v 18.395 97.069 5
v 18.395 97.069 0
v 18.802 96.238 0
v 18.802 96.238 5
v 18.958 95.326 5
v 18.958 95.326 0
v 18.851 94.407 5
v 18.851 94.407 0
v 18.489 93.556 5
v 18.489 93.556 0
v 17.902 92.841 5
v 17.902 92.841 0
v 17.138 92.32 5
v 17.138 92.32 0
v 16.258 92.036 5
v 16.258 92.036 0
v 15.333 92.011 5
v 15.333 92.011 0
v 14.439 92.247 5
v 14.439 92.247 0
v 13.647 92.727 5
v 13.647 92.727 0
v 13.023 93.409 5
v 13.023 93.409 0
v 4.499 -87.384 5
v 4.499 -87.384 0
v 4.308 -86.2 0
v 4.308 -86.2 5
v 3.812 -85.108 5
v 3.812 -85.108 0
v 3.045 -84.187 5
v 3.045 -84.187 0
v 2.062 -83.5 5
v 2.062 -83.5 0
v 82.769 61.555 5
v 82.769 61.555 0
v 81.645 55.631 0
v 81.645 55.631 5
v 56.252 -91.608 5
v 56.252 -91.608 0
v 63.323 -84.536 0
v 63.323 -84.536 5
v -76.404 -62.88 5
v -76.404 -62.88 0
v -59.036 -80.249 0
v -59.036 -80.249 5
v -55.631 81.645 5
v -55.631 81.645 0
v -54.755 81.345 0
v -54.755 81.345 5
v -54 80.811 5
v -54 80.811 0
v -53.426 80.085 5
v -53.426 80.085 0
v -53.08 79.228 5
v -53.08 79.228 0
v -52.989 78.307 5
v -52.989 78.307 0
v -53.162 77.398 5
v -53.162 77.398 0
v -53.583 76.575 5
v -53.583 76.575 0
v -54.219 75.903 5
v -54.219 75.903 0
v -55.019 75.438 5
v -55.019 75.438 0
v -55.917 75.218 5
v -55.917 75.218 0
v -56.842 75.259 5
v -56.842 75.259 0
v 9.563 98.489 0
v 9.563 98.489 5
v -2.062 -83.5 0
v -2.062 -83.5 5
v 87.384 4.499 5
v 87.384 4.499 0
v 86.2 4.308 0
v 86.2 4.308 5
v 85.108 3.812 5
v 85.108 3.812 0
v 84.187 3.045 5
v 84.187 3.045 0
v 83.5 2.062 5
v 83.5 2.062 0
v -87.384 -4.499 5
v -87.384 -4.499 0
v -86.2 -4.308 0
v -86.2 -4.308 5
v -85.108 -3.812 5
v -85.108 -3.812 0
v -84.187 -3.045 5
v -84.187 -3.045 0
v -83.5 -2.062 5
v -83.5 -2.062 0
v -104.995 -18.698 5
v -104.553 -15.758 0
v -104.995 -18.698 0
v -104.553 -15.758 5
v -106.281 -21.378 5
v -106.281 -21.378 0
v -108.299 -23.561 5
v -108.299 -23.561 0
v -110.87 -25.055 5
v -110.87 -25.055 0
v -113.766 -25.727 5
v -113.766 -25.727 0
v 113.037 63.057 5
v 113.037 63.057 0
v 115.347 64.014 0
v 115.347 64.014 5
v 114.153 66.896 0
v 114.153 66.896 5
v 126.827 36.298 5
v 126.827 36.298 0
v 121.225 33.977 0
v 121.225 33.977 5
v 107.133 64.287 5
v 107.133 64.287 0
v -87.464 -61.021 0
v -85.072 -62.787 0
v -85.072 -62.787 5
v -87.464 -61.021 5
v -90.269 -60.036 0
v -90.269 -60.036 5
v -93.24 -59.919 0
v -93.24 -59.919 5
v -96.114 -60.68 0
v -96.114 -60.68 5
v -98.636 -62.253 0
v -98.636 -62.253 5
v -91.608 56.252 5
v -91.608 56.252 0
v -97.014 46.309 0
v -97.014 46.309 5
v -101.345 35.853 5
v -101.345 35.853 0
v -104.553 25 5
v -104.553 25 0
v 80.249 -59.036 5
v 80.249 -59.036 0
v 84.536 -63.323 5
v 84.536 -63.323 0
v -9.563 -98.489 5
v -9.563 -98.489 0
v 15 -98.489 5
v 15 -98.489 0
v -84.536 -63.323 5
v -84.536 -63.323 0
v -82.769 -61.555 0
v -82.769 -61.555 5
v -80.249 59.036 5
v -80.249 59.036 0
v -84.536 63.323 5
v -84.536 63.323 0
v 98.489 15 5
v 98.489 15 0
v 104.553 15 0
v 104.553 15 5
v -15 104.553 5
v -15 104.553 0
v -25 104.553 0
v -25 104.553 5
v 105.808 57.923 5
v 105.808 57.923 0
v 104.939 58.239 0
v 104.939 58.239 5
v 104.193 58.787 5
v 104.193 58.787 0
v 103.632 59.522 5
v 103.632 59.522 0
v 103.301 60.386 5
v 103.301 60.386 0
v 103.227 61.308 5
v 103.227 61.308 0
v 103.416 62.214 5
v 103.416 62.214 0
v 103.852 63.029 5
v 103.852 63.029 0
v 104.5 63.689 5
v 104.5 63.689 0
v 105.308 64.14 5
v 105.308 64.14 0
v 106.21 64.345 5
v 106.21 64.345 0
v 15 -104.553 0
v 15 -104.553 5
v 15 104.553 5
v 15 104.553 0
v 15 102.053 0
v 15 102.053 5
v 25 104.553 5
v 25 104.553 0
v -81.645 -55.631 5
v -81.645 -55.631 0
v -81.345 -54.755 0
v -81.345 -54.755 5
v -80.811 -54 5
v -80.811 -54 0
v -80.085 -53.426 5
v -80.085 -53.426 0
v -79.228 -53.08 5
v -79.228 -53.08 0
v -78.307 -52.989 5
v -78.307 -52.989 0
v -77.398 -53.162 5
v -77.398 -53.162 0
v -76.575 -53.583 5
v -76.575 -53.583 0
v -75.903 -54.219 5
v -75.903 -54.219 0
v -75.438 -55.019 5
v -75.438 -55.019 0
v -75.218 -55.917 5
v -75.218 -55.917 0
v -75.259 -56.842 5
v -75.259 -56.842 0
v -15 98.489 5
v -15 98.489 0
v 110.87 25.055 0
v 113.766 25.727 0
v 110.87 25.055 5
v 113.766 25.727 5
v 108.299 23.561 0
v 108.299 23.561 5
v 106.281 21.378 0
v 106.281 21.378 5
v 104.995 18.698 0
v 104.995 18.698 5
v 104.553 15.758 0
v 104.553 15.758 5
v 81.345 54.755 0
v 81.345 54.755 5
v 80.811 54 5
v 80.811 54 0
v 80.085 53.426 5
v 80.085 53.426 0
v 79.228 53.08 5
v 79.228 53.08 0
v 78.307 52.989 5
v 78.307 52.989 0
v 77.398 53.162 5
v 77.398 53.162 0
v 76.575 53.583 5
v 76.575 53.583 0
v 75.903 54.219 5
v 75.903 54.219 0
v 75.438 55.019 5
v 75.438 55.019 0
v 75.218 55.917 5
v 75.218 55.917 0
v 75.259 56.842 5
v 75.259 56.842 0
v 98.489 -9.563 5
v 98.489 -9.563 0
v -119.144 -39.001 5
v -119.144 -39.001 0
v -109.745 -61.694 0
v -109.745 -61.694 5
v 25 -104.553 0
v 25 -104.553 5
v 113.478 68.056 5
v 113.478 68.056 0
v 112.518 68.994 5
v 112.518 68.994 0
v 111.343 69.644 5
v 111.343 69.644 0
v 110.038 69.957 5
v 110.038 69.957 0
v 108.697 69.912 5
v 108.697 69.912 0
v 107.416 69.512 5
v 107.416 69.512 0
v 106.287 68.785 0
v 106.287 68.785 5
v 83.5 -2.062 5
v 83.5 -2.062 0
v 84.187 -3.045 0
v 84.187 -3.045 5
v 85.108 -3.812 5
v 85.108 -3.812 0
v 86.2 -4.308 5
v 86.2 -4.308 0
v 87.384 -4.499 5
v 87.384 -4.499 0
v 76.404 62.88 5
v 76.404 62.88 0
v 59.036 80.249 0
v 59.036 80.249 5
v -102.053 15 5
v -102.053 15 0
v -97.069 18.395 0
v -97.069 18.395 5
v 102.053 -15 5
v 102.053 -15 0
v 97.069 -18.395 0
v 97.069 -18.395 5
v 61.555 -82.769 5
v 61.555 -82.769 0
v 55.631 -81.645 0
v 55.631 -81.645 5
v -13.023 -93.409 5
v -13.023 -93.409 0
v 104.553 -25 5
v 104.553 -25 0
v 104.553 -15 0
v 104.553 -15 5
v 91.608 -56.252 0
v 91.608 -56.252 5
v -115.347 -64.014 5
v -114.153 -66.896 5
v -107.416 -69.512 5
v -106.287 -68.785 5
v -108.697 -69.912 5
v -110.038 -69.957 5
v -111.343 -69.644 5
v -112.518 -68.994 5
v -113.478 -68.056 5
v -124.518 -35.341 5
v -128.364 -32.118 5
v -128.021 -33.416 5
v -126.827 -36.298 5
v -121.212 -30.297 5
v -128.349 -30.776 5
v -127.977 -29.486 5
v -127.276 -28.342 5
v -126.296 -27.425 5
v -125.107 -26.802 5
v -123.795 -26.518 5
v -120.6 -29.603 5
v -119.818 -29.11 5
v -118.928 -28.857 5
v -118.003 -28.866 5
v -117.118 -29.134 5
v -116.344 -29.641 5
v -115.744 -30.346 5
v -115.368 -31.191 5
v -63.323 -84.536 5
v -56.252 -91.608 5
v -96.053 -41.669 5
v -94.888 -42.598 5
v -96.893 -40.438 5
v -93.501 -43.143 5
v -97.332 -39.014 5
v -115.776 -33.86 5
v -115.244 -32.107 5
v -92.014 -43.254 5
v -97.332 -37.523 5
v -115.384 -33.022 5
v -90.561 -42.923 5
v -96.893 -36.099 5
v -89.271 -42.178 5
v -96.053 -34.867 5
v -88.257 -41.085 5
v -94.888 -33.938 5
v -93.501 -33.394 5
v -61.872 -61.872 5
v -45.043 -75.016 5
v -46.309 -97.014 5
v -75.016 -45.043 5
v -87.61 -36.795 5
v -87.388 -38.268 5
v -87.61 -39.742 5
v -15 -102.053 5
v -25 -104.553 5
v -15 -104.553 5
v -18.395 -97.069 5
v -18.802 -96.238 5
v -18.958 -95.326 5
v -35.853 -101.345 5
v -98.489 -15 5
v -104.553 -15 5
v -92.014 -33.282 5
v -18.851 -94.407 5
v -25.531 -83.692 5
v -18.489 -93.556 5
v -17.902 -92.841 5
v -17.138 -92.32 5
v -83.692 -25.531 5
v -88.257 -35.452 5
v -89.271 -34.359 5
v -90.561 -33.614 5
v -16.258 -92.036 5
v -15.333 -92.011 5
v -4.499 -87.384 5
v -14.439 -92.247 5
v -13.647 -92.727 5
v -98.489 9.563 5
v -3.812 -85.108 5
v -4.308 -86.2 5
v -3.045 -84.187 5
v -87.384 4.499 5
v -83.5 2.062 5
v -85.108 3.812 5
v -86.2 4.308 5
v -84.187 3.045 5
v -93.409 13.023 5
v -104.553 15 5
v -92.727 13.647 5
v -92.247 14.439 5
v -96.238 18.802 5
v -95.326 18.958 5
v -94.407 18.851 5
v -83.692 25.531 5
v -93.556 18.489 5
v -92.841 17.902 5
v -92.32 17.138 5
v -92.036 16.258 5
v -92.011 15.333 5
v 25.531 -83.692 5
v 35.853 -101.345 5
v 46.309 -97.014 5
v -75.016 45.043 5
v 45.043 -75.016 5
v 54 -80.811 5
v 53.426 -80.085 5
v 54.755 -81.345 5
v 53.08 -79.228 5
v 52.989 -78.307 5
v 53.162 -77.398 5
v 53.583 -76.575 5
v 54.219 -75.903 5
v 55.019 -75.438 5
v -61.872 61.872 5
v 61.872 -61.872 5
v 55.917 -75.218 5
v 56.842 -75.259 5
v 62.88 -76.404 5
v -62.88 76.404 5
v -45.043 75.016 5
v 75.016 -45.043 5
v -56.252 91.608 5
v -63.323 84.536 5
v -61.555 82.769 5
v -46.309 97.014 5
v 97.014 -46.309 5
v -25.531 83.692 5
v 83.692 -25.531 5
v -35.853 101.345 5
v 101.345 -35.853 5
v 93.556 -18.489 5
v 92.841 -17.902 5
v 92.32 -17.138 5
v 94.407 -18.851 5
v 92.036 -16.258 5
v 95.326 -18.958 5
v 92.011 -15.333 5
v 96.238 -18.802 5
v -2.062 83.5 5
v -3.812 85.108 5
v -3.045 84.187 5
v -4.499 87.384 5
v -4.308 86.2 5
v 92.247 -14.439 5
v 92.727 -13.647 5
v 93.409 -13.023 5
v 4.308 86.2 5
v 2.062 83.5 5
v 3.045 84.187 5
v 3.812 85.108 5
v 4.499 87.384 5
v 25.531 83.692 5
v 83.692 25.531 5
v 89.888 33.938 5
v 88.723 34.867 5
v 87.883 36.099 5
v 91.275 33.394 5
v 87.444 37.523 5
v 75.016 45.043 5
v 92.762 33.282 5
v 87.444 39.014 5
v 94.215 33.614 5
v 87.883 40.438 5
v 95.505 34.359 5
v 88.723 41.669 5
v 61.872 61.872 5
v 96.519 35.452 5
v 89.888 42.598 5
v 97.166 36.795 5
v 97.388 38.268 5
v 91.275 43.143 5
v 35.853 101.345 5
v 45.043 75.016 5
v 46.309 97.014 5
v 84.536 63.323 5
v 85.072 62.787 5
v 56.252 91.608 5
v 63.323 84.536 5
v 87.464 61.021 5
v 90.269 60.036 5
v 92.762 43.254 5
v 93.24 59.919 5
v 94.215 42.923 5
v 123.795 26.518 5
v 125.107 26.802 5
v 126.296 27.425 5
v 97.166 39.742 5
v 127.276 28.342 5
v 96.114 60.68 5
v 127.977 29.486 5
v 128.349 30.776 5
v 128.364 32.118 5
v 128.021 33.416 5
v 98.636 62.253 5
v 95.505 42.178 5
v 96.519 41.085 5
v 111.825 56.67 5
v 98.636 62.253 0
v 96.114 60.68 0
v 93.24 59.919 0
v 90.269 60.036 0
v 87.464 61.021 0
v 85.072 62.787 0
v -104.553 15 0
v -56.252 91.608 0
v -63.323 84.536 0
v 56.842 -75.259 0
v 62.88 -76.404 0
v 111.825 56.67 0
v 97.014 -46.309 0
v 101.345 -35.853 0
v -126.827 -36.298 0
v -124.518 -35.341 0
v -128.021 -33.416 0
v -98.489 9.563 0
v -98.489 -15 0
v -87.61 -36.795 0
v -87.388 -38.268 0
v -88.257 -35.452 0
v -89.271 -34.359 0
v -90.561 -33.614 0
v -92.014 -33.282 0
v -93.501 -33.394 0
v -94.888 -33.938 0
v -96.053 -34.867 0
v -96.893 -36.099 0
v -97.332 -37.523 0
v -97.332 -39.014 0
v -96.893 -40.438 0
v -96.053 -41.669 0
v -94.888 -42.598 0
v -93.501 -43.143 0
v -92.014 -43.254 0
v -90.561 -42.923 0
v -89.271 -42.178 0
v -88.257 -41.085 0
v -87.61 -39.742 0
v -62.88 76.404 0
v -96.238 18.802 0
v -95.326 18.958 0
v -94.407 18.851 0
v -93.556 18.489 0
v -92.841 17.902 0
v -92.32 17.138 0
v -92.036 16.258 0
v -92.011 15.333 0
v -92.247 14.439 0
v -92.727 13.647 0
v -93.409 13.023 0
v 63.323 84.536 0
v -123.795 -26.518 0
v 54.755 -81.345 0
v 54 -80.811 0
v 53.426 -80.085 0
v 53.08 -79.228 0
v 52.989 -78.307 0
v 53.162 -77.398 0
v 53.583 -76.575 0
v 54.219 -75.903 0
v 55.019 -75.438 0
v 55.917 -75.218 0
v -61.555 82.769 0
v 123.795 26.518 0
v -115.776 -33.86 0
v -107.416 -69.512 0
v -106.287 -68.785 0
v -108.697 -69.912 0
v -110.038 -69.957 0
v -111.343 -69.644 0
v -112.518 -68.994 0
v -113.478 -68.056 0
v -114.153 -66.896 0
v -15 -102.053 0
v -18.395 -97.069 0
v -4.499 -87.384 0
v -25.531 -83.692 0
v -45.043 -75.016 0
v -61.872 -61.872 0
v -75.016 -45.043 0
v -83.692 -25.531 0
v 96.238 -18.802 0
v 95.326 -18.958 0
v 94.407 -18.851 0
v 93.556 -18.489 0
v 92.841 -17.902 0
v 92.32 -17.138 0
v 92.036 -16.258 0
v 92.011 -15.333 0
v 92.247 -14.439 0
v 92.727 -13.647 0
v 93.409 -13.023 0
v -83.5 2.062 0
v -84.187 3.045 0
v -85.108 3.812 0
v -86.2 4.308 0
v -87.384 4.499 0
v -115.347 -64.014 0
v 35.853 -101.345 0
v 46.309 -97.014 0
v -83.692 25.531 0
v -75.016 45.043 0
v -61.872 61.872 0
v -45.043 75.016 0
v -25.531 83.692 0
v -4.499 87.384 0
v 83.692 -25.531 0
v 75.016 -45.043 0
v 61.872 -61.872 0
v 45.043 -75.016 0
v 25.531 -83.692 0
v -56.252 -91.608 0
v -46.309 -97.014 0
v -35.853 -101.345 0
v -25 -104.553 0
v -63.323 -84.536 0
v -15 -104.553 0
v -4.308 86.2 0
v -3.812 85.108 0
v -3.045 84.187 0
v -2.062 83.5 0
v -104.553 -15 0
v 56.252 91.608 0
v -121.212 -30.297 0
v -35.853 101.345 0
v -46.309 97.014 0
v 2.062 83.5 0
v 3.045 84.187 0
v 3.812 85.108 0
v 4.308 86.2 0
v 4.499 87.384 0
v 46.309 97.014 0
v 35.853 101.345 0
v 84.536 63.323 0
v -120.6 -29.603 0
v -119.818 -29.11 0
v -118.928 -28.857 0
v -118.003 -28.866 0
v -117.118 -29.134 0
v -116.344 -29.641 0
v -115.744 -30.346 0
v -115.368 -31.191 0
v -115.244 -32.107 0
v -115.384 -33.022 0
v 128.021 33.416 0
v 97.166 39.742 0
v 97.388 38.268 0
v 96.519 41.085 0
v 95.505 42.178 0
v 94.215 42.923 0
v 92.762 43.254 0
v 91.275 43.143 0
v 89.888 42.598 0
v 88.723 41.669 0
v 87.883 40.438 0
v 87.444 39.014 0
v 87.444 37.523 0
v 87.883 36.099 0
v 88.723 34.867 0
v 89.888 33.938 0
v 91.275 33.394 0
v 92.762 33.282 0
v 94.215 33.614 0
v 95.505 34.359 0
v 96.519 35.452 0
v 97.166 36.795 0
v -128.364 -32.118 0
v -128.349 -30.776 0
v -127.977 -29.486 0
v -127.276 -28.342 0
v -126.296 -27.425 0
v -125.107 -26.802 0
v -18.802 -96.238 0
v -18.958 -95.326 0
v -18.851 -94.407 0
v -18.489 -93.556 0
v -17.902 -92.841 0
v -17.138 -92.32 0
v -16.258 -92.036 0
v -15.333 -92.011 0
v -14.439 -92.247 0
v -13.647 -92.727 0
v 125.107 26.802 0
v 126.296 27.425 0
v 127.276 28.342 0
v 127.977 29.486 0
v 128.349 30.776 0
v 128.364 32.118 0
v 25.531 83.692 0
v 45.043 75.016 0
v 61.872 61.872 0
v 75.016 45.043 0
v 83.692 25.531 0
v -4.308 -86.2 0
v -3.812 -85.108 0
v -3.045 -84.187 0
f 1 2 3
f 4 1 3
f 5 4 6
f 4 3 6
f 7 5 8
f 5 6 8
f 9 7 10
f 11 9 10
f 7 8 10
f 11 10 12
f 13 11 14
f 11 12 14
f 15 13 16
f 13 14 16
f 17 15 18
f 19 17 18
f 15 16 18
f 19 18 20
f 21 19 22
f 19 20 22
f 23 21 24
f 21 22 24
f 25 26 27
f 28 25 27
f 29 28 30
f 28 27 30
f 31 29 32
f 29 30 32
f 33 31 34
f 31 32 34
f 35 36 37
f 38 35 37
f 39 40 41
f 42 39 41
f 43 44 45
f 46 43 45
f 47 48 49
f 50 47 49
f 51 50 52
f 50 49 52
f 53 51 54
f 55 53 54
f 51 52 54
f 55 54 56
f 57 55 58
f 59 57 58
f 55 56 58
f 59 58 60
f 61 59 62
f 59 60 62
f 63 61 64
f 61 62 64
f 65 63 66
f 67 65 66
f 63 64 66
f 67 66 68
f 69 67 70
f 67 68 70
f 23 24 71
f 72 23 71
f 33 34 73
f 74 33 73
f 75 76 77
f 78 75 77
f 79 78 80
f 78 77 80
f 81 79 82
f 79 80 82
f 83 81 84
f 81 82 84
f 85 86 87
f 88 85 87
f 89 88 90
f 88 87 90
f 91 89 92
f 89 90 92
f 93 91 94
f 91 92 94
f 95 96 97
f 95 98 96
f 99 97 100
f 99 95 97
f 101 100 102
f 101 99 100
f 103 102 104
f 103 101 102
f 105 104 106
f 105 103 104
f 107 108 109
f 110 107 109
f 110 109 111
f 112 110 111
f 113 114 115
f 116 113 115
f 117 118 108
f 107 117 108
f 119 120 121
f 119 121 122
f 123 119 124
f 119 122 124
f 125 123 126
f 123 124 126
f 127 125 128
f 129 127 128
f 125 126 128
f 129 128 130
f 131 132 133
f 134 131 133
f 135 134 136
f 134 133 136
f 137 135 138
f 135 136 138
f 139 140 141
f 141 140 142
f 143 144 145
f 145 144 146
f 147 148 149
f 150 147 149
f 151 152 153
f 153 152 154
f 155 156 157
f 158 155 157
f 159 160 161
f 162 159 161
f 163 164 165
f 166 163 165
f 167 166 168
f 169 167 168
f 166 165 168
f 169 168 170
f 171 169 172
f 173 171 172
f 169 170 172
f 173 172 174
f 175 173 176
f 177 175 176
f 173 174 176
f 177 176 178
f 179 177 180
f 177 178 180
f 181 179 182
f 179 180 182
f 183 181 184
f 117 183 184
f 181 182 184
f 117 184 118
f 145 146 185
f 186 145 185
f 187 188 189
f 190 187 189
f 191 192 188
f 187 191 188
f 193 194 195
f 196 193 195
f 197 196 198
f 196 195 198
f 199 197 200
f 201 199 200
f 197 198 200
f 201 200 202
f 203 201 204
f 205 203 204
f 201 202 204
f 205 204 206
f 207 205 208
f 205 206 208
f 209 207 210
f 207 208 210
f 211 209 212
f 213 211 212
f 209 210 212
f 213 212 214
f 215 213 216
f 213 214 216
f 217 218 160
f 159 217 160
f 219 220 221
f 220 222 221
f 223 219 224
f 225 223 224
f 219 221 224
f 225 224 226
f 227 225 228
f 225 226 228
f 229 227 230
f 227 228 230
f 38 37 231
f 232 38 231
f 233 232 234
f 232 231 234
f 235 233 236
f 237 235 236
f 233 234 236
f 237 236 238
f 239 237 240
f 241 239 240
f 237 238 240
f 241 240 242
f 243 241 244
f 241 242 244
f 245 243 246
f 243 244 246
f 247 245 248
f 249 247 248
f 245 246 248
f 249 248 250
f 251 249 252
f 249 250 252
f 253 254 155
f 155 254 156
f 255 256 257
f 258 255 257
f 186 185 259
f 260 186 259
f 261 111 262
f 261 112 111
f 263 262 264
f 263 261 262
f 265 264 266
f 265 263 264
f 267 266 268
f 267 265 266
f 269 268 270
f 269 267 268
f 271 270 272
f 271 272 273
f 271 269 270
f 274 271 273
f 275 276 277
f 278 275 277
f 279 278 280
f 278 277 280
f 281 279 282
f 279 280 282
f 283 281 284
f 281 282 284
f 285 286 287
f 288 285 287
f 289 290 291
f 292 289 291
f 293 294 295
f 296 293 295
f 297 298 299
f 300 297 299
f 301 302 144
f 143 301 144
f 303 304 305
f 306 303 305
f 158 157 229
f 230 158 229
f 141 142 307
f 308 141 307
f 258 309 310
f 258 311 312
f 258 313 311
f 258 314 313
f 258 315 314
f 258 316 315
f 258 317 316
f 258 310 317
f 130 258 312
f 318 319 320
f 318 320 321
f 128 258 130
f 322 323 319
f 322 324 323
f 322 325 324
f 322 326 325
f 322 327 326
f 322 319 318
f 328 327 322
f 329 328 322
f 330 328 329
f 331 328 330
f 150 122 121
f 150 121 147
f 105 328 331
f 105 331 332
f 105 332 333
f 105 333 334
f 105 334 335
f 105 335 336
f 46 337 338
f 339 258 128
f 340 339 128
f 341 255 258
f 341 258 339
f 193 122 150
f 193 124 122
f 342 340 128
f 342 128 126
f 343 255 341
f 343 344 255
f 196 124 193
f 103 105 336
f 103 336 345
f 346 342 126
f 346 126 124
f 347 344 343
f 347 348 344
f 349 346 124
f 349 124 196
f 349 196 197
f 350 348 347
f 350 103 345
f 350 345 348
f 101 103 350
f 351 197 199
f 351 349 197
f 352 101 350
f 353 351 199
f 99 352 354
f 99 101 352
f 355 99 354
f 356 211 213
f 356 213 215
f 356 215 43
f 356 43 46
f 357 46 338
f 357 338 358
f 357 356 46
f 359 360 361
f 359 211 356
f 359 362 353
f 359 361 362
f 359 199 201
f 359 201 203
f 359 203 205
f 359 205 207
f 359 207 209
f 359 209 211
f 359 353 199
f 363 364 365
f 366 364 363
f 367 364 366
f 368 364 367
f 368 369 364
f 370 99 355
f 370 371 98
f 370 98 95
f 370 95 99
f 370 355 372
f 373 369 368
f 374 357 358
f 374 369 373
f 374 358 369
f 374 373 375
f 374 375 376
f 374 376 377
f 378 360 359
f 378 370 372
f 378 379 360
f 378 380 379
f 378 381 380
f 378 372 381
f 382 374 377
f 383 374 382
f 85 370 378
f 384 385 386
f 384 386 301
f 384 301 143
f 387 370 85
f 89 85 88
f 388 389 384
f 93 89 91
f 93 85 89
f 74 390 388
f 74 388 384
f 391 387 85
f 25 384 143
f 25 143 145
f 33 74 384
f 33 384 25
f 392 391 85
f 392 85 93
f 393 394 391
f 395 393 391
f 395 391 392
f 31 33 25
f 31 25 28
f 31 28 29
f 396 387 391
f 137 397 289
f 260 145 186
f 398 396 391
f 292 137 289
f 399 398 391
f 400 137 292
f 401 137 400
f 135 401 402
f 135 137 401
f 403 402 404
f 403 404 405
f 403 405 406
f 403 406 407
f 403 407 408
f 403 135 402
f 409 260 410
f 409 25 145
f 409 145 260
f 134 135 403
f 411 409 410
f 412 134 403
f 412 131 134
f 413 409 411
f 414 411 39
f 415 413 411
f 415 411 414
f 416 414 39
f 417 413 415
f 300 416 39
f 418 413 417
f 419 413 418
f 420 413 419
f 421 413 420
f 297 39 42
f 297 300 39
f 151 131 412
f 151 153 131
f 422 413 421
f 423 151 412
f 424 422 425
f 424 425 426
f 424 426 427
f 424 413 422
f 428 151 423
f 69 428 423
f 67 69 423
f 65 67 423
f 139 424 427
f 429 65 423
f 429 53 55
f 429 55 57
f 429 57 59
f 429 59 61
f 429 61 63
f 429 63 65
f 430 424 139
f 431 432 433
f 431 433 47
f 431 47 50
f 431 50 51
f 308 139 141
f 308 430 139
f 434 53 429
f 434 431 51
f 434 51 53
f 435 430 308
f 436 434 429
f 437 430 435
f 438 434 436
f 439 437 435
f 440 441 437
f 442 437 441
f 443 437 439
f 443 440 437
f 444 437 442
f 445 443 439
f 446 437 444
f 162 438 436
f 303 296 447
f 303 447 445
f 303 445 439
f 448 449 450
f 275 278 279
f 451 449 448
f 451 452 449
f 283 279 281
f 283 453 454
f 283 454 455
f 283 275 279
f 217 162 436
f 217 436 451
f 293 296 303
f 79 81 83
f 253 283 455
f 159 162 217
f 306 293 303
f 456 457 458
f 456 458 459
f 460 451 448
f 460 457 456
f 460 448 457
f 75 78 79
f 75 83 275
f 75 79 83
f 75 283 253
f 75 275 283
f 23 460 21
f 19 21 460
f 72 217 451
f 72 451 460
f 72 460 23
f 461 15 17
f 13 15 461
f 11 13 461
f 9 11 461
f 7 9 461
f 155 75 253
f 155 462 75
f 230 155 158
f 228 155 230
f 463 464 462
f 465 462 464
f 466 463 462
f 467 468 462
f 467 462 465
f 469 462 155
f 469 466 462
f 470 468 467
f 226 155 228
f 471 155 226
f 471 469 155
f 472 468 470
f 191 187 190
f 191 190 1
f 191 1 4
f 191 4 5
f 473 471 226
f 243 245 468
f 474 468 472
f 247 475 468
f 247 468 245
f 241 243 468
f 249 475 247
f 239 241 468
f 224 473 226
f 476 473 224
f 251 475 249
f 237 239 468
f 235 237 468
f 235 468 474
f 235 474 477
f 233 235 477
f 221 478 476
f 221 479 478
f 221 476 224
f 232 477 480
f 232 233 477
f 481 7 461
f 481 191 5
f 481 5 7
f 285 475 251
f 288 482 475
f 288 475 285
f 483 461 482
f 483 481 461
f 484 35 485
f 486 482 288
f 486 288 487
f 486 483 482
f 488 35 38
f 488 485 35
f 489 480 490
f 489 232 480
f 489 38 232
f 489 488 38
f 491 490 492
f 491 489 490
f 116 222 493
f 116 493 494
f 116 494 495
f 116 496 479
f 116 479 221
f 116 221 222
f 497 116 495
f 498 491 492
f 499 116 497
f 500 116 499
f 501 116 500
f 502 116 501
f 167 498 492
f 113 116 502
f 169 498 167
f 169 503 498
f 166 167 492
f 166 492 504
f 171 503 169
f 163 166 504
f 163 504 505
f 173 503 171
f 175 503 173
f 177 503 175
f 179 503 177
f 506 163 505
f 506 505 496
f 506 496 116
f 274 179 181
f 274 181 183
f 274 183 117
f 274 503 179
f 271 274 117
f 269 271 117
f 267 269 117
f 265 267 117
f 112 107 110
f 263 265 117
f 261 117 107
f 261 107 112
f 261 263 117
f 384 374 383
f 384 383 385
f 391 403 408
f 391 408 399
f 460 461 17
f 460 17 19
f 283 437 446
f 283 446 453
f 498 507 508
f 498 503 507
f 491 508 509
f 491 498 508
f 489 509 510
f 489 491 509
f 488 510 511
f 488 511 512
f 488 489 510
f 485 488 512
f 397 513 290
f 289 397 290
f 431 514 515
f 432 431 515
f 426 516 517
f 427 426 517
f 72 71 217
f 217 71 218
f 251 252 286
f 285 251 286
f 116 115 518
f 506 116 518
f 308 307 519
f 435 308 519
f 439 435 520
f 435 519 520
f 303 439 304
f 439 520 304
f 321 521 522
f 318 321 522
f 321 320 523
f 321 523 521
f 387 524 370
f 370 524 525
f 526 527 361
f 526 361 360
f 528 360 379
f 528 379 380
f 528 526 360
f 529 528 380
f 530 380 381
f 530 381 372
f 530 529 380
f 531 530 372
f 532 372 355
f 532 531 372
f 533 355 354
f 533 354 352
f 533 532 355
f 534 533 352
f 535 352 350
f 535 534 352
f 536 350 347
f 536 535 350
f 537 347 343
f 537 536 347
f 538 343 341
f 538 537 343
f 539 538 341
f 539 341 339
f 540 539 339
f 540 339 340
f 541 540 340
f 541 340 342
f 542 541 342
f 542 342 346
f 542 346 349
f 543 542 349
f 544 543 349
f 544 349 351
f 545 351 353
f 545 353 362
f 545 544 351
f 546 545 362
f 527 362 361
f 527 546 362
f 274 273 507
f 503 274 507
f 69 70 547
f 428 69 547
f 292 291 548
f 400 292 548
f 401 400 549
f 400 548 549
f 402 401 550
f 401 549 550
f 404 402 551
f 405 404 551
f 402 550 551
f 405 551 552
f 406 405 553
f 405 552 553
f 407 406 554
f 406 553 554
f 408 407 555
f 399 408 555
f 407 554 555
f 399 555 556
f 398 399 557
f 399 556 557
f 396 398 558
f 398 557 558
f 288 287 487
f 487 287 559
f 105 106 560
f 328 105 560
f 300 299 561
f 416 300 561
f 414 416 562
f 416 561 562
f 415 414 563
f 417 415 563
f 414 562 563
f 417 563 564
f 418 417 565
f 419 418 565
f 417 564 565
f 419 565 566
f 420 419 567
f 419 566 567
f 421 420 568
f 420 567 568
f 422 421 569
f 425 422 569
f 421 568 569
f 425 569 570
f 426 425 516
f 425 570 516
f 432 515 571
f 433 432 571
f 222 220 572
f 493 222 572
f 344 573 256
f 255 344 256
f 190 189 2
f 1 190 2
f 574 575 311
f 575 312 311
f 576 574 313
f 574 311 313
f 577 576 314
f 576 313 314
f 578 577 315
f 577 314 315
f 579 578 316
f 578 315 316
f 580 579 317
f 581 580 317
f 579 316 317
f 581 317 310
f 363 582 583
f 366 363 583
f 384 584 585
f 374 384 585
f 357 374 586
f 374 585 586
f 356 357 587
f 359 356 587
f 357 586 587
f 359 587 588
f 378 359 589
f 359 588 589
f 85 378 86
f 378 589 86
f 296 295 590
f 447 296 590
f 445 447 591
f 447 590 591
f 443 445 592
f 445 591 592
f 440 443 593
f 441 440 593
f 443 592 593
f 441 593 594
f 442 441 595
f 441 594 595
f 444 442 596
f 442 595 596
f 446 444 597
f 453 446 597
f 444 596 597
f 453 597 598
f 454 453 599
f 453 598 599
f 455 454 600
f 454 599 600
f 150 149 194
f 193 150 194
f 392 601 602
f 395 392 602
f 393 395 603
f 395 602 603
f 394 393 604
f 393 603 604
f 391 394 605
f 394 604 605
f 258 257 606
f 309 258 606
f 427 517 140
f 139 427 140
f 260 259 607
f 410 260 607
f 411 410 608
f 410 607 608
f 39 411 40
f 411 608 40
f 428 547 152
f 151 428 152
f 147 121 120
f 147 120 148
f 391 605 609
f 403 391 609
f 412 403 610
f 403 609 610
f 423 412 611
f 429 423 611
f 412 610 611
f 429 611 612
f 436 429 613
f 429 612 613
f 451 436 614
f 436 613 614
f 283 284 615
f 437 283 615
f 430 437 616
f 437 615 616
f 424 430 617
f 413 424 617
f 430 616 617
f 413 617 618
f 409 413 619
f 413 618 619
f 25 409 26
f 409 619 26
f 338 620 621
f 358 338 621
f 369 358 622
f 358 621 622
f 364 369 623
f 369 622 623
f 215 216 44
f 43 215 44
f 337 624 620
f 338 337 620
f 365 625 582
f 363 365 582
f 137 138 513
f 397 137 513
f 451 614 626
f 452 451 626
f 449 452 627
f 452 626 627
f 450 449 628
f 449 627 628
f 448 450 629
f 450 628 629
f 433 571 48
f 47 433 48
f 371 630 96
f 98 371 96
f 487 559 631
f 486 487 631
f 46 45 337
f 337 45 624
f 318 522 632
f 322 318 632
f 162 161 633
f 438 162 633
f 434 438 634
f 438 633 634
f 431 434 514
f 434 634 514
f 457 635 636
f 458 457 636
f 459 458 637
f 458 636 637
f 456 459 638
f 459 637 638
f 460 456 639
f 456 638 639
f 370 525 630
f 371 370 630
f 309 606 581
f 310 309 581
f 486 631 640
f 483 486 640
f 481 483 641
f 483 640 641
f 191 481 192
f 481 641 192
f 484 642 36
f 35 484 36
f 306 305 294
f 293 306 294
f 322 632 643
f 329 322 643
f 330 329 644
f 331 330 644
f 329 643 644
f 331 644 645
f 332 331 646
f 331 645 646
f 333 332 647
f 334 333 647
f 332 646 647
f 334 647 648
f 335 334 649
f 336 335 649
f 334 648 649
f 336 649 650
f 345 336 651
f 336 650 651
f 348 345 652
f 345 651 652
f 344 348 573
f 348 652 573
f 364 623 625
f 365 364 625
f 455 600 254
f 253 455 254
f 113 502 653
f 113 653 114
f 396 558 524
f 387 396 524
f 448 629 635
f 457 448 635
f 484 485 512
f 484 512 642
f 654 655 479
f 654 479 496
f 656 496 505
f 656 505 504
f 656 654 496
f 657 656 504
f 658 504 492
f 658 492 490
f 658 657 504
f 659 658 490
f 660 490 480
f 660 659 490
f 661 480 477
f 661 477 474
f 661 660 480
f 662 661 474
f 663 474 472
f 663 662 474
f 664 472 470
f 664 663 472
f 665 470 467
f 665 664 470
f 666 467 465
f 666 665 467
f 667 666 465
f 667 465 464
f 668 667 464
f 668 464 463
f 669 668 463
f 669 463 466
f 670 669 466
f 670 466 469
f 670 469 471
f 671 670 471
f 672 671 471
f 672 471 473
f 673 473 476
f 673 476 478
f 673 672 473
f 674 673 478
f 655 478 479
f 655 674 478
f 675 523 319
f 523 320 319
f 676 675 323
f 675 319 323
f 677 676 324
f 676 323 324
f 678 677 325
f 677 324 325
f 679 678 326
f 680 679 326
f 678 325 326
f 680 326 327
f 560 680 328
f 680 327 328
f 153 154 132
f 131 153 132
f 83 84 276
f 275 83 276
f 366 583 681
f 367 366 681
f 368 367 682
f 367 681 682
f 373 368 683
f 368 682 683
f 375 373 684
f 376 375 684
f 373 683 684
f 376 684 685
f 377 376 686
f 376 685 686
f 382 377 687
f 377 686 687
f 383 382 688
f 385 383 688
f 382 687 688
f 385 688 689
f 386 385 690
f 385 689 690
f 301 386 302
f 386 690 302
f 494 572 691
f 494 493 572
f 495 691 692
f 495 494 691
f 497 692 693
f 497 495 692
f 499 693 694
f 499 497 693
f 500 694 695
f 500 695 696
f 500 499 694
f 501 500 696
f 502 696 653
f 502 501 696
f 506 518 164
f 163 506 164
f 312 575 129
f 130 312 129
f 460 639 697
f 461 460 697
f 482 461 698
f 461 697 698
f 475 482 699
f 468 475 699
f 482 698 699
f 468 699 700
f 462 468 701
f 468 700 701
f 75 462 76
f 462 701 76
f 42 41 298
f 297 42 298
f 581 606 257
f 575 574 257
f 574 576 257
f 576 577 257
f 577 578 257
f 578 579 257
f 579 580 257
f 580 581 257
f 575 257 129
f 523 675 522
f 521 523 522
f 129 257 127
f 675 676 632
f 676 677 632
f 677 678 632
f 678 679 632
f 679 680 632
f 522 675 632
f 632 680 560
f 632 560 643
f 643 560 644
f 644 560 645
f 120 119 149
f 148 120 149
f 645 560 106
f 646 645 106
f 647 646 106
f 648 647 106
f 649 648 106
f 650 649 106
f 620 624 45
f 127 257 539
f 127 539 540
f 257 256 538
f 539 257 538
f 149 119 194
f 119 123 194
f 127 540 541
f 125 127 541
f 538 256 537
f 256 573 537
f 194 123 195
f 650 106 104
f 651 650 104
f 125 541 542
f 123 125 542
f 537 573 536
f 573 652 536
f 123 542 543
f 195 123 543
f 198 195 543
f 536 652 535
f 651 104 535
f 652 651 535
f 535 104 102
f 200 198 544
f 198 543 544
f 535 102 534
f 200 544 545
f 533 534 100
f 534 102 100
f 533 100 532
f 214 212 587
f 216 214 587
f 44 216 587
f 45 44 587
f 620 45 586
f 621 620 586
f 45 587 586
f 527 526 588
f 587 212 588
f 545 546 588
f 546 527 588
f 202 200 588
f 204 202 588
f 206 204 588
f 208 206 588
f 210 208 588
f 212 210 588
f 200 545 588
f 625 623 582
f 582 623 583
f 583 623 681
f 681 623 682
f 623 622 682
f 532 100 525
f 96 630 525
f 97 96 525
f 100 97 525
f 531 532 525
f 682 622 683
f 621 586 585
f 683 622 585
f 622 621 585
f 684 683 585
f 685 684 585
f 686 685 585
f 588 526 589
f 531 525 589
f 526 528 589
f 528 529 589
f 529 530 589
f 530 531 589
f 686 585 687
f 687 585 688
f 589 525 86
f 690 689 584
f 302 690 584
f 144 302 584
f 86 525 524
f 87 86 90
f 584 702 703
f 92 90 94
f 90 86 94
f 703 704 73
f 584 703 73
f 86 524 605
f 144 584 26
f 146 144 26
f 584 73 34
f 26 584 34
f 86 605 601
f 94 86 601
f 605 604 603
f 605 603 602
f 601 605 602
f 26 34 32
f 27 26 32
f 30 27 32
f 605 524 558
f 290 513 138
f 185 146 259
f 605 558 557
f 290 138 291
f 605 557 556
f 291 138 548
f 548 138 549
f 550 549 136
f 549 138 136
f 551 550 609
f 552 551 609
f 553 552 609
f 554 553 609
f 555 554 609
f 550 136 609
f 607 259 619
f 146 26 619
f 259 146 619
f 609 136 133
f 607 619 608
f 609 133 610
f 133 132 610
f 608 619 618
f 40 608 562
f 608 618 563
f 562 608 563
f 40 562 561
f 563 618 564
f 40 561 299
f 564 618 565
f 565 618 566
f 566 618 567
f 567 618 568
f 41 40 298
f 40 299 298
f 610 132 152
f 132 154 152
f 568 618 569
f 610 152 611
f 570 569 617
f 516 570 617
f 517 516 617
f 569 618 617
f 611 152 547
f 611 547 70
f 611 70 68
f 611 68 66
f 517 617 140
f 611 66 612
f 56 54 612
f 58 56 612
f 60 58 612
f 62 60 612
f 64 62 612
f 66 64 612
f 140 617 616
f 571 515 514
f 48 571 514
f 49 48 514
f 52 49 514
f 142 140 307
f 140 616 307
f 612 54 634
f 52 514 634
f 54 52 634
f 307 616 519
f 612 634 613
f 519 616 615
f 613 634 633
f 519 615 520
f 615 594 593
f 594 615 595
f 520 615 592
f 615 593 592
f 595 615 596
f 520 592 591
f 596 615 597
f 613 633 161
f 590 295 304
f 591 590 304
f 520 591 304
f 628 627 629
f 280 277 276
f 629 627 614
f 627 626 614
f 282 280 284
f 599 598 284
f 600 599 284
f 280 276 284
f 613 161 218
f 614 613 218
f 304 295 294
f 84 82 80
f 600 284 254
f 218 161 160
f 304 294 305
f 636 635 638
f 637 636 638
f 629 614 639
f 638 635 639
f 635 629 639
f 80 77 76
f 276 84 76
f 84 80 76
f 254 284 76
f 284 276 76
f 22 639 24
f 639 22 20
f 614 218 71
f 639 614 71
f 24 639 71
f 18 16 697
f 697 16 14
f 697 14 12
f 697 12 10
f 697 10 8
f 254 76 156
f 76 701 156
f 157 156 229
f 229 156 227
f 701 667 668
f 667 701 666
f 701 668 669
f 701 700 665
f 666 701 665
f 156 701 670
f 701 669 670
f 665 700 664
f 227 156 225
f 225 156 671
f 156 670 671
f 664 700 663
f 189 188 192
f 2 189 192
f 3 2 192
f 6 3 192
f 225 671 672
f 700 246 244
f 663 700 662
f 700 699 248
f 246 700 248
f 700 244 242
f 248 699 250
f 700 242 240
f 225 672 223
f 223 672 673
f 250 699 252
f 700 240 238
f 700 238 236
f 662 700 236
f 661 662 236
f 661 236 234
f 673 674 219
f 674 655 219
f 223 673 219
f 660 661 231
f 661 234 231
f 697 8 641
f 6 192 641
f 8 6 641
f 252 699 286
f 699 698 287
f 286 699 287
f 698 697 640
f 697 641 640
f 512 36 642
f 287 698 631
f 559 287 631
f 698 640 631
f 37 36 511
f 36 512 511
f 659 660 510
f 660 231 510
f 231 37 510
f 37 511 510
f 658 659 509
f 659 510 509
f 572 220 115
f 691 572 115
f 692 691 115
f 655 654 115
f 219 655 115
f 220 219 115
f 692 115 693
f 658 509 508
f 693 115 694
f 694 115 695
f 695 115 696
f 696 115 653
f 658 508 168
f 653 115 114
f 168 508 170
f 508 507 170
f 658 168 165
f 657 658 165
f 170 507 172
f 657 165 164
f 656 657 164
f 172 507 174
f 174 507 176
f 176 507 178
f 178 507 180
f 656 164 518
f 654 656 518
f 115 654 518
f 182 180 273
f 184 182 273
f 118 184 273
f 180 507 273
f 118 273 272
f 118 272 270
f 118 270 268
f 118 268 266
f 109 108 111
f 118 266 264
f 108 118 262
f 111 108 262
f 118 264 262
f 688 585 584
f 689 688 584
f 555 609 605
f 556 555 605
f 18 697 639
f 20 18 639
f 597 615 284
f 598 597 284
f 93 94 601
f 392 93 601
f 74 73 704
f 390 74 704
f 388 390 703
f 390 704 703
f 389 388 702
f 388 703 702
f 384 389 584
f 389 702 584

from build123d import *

# Parameters (mm, degrees)
BOSS_EXTRU_1_OUTLINE_R = 5
BOSS_EXTRU_1_DEPTH     = 5
CONG_2_R               = 10
CONG_3_R               = 5


# Read off the part's stored shape, not the designer's step: Boss.-Extru.1
with BuildPart() as part:
    # Boss.-Extru.1 outline → Boss.-Extru.1 (new body)
    with BuildSketch(Plane.XY):
        with BuildLine():
            Line((111.825417275, 56.670302216), (105.808192277, 57.923261539))
            ThreePointArc((105.808192277, 57.923261539), (103.288971945, 61.767546768), (107.133257174, 64.2867671))
            Line((107.133257174, 64.2867671), (113.037155155, 63.057405721))
            Line((113.037155155, 63.057405721), (115.346853986, 64.014114302))
            Line((115.346853986, 64.014114302), (111.520019662, 73.252909628))
            Line((111.520019662, 73.252909628), (91.607534943, 56.252195883))
            Line((91.607534943, 56.252195883), (84.536467131, 63.323263695))
            Line((84.536467131, 63.323263695), (82.768700178, 61.555496742))
            Line((82.768700178, 61.555496742), (81.64515805, 55.630550004))
            ThreePointArc((81.64515805, 55.630550004), (77.846557681, 53.042957448), (75.258965125, 56.841557817))
            Line((75.258965125, 56.841557817), (76.404073966, 62.880235609))
            Line((76.404073966, 62.880235609), (59.03555307, 80.248756505))
            Line((59.03555307, 80.248756505), (63.323263695, 84.536467131))
            Line((63.323263695, 84.536467131), (56.252195883, 91.607534943))
            ThreePointArc((56.252195883, 91.607534943), (41.138468979, 99.317049745), (25, 104.552618332))
            Line((25, 104.552618332), (15, 104.552618332))
            Line((15, 104.552618332), (15, 102.052618332))
            Line((15, 102.052618332), (18.395105759, 97.068584057))
            ThreePointArc((18.395105759, 97.068584057), (17.538793922, 92.552863734), (13.023073599, 93.40917557))
            Line((13.023073599, 93.40917557), (9.56279781, 98.488879813))
            Line((9.56279781, 98.488879813), (-15, 98.488879813))
            Line((-15, 98.488879813), (-15, 104.552618332))
            Line((-15, 104.552618332), (-25, 104.552618332))
            ThreePointArc((-25, 104.552618332), (-41.138468979, 99.317049745), (-56.252195883, 91.607534943))
            Line((-56.252195883, 91.607534943), (-63.323263695, 84.536467131))
            Line((-63.323263695, 84.536467131), (-61.555496742, 82.768700178))
            Line((-61.555496742, 82.768700178), (-55.630550004, 81.64515805))
            ThreePointArc((-55.630550004, 81.64515805), (-53.042957448, 77.846557681), (-56.841557817, 75.258965125))
            Line((-56.841557817, 75.258965125), (-62.880235609, 76.404073966))
            Line((-62.880235609, 76.404073966), (-80.248756505, 59.03555307))
            Line((-80.248756505, 59.03555307), (-84.536467131, 63.323263695))
            Line((-84.536467131, 63.323263695), (-91.607534943, 56.252195883))
            ThreePointArc((-91.607534943, 56.252195883), (-99.317049745, 41.138468979), (-104.552618332, 25))
            Line((-104.552618332, 25), (-104.552618332, 15))
            Line((-104.552618332, 15), (-102.052618332, 15))
            Line((-102.052618332, 15), (-97.068584057, 18.395105759))
            ThreePointArc((-97.068584057, 18.395105759), (-92.552863734, 17.538793922), (-93.40917557, 13.023073599))
            Line((-93.40917557, 13.023073599), (-98.488879813, 9.56279781))
            Line((-98.488879813, 9.56279781), (-98.488879813, -15))
            Line((-98.488879813, -15), (-104.552618332, -15))
            Line((-104.552618332, -15), (-104.552618332, -25))
            Line((-104.552618332, -25), (-130.65419128, -27.058933002))
            Line((-130.65419128, -27.058933002), (-126.827356957, -36.297728327))
            Line((-126.827356957, -36.297728327), (-124.517658126, -35.341019746))
            Line((-124.517658126, -35.341019746), (-121.212261595, -30.297043681))
            ThreePointArc((-121.212261595, -30.297043681), (-116.712583661, -29.360081308), (-115.775621287, -33.859759242))
            Line((-115.775621287, -33.859759242), (-119.144465853, -39.000555875))
            Line((-119.144465853, -39.000555875), (-109.744690078, -61.693622033))
            Line((-109.744690078, -61.693622033), (-115.346853986, -64.014114302))
            Line((-115.346853986, -64.014114302), (-111.520019662, -73.252909628))
            Line((-111.520019662, -73.252909628), (-91.607534943, -56.252195883))
            Line((-91.607534943, -56.252195883), (-84.536467131, -63.323263695))
            Line((-84.536467131, -63.323263695), (-82.768700178, -61.555496742))
            Line((-82.768700178, -61.555496742), (-81.64515805, -55.630550004))
            ThreePointArc((-81.64515805, -55.630550004), (-77.846557681, -53.042957448), (-75.258965125, -56.841557817))
            Line((-75.258965125, -56.841557817), (-76.404073966, -62.880235609))
            Line((-76.404073966, -62.880235609), (-59.03555307, -80.248756505))
            Line((-59.03555307, -80.248756505), (-63.323263695, -84.536467131))
            Line((-63.323263695, -84.536467131), (-56.252195883, -91.607534943))
            ThreePointArc((-56.252195883, -91.607534943), (-41.138468979, -99.317049745), (-25, -104.552618332))
            Line((-25, -104.552618332), (-15, -104.552618332))
            Line((-15, -104.552618332), (-15, -102.052618332))
            Line((-15, -102.052618332), (-18.395105759, -97.068584057))
            ThreePointArc((-18.395105759, -97.068584057), (-17.538793922, -92.552863734), (-13.023073599, -93.40917557))
            Line((-13.023073599, -93.40917557), (-9.56279781, -98.488879813))
            Line((-9.56279781, -98.488879813), (15, -98.488879813))
            Line((15, -98.488879813), (15, -104.552618332))
            Line((15, -104.552618332), (25, -104.552618332))
            ThreePointArc((25, -104.552618332), (41.138468979, -99.317049745), (56.252195883, -91.607534943))
            Line((56.252195883, -91.607534943), (63.323263695, -84.536467131))
            Line((63.323263695, -84.536467131), (61.555496742, -82.768700178))
            Line((61.555496742, -82.768700178), (55.630550004, -81.64515805))
            ThreePointArc((55.630550004, -81.64515805), (53.042957448, -77.846557681), (56.841557817, -75.258965125))
            Line((56.841557817, -75.258965125), (62.880235609, -76.404073966))
            Line((62.880235609, -76.404073966), (80.248756505, -59.03555307))
            Line((80.248756505, -59.03555307), (84.536467131, -63.323263695))
            Line((84.536467131, -63.323263695), (91.607534943, -56.252195883))
            ThreePointArc((91.607534943, -56.252195883), (99.317049745, -41.138468979), (104.552618332, -25))
            Line((104.552618332, -25), (104.552618332, -15))
            Line((104.552618332, -15), (102.052618332, -15))
            Line((102.052618332, -15), (97.068584057, -18.395105759))
            ThreePointArc((97.068584057, -18.395105759), (92.552863734, -17.538793922), (93.40917557, -13.023073599))
            Line((93.40917557, -13.023073599), (98.488879813, -9.56279781))
            Line((98.488879813, -9.56279781), (98.488879813, 15))
            Line((98.488879813, 15), (104.552618332, 15))
            Line((104.552618332, 15), (104.552618332, 25))
            Line((104.552618332, 25), (130.65419128, 27.058933002))
            Line((130.65419128, 27.058933002), (126.827356957, 36.297728327))
            Line((126.827356957, 36.297728327), (121.225193049, 33.977236058))
            Line((121.225193049, 33.977236058), (111.825417275, 56.670302216))
        make_face()
        with Locations((-92.387953251, -38.268343237)):
            Circle(BOSS_EXTRU_1_OUTLINE_R, mode=Mode.SUBTRACT)
        with BuildLine():
            ThreePointArc((-2.061552813, -83.5), (-3.811893422, -85.108458961), (-4.498511999, -87.384285714))
            ThreePointArc((-4.498511999, -87.384285714), (-61.871843354, -61.871843354), (-87.384285714, -4.498511999))
            ThreePointArc((-87.384285714, -4.498511999), (-85.108458961, -3.811893422), (-83.5, -2.061552813))
            Line((-83.5, -2.061552813), (-83.5, 2.061552813))
            ThreePointArc((-83.5, 2.061552813), (-85.108458961, 3.811893422), (-87.384285714, 4.498511999))
            ThreePointArc((-87.384285714, 4.498511999), (-61.871843354, 61.871843354), (-4.498511999, 87.384285714))
            ThreePointArc((-4.498511999, 87.384285714), (-3.811893422, 85.108458961), (-2.061552813, 83.5))
            Line((-2.061552813, 83.5), (2.061552813, 83.5))
            ThreePointArc((2.061552813, 83.5), (3.811893422, 85.108458961), (4.498511999, 87.384285714))
            ThreePointArc((4.498511999, 87.384285714), (61.871843354, 61.871843354), (87.384285714, 4.498511999))
            ThreePointArc((87.384285714, 4.498511999), (85.108458961, 3.811893422), (83.5, 2.061552813))
            Line((83.5, 2.061552813), (83.5, -2.061552813))
            ThreePointArc((83.5, -2.061552813), (85.108458961, -3.811893422), (87.384285714, -4.498511999))
            ThreePointArc((87.384285714, -4.498511999), (61.871843354, -61.871843354), (4.498511999, -87.384285714))
            ThreePointArc((4.498511999, -87.384285714), (3.811893422, -85.108458961), (2.061552813, -83.5))
            Line((2.061552813, -83.5), (-2.061552813, -83.5))
        make_face(mode=Mode.SUBTRACT)
        with Locations((92.387953251, 38.268343237)):
            Circle(BOSS_EXTRU_1_OUTLINE_R, mode=Mode.SUBTRACT)
    extrude(amount=BOSS_EXTRU_1_DEPTH)

    # Congé2
    cong_2_edges = [part.edges().sort_by_distance(p)[0] for p in [
        (104.552618332, 25, 2.5),
        (-91.607534943, -56.252195883, 2.5),
        (-104.552618332, -25, 2.5),
        (91.607534943, 56.252195883, 2.5),
    ]]
    fillet(cong_2_edges, radius=CONG_2_R)

    # Congé3
    cong_3_edges = [part.edges().sort_by_distance(p)[0] for p in [
        (130.65419128, 27.058933002, 2.5),
        (-111.520019662, -73.252909628, 2.5),
        (-130.65419128, -27.058933002, 2.5),
        (111.520019662, 73.252909628, 2.5),
    ]]
    fillet(cong_3_edges, radius=CONG_3_R)


solid = part.part
